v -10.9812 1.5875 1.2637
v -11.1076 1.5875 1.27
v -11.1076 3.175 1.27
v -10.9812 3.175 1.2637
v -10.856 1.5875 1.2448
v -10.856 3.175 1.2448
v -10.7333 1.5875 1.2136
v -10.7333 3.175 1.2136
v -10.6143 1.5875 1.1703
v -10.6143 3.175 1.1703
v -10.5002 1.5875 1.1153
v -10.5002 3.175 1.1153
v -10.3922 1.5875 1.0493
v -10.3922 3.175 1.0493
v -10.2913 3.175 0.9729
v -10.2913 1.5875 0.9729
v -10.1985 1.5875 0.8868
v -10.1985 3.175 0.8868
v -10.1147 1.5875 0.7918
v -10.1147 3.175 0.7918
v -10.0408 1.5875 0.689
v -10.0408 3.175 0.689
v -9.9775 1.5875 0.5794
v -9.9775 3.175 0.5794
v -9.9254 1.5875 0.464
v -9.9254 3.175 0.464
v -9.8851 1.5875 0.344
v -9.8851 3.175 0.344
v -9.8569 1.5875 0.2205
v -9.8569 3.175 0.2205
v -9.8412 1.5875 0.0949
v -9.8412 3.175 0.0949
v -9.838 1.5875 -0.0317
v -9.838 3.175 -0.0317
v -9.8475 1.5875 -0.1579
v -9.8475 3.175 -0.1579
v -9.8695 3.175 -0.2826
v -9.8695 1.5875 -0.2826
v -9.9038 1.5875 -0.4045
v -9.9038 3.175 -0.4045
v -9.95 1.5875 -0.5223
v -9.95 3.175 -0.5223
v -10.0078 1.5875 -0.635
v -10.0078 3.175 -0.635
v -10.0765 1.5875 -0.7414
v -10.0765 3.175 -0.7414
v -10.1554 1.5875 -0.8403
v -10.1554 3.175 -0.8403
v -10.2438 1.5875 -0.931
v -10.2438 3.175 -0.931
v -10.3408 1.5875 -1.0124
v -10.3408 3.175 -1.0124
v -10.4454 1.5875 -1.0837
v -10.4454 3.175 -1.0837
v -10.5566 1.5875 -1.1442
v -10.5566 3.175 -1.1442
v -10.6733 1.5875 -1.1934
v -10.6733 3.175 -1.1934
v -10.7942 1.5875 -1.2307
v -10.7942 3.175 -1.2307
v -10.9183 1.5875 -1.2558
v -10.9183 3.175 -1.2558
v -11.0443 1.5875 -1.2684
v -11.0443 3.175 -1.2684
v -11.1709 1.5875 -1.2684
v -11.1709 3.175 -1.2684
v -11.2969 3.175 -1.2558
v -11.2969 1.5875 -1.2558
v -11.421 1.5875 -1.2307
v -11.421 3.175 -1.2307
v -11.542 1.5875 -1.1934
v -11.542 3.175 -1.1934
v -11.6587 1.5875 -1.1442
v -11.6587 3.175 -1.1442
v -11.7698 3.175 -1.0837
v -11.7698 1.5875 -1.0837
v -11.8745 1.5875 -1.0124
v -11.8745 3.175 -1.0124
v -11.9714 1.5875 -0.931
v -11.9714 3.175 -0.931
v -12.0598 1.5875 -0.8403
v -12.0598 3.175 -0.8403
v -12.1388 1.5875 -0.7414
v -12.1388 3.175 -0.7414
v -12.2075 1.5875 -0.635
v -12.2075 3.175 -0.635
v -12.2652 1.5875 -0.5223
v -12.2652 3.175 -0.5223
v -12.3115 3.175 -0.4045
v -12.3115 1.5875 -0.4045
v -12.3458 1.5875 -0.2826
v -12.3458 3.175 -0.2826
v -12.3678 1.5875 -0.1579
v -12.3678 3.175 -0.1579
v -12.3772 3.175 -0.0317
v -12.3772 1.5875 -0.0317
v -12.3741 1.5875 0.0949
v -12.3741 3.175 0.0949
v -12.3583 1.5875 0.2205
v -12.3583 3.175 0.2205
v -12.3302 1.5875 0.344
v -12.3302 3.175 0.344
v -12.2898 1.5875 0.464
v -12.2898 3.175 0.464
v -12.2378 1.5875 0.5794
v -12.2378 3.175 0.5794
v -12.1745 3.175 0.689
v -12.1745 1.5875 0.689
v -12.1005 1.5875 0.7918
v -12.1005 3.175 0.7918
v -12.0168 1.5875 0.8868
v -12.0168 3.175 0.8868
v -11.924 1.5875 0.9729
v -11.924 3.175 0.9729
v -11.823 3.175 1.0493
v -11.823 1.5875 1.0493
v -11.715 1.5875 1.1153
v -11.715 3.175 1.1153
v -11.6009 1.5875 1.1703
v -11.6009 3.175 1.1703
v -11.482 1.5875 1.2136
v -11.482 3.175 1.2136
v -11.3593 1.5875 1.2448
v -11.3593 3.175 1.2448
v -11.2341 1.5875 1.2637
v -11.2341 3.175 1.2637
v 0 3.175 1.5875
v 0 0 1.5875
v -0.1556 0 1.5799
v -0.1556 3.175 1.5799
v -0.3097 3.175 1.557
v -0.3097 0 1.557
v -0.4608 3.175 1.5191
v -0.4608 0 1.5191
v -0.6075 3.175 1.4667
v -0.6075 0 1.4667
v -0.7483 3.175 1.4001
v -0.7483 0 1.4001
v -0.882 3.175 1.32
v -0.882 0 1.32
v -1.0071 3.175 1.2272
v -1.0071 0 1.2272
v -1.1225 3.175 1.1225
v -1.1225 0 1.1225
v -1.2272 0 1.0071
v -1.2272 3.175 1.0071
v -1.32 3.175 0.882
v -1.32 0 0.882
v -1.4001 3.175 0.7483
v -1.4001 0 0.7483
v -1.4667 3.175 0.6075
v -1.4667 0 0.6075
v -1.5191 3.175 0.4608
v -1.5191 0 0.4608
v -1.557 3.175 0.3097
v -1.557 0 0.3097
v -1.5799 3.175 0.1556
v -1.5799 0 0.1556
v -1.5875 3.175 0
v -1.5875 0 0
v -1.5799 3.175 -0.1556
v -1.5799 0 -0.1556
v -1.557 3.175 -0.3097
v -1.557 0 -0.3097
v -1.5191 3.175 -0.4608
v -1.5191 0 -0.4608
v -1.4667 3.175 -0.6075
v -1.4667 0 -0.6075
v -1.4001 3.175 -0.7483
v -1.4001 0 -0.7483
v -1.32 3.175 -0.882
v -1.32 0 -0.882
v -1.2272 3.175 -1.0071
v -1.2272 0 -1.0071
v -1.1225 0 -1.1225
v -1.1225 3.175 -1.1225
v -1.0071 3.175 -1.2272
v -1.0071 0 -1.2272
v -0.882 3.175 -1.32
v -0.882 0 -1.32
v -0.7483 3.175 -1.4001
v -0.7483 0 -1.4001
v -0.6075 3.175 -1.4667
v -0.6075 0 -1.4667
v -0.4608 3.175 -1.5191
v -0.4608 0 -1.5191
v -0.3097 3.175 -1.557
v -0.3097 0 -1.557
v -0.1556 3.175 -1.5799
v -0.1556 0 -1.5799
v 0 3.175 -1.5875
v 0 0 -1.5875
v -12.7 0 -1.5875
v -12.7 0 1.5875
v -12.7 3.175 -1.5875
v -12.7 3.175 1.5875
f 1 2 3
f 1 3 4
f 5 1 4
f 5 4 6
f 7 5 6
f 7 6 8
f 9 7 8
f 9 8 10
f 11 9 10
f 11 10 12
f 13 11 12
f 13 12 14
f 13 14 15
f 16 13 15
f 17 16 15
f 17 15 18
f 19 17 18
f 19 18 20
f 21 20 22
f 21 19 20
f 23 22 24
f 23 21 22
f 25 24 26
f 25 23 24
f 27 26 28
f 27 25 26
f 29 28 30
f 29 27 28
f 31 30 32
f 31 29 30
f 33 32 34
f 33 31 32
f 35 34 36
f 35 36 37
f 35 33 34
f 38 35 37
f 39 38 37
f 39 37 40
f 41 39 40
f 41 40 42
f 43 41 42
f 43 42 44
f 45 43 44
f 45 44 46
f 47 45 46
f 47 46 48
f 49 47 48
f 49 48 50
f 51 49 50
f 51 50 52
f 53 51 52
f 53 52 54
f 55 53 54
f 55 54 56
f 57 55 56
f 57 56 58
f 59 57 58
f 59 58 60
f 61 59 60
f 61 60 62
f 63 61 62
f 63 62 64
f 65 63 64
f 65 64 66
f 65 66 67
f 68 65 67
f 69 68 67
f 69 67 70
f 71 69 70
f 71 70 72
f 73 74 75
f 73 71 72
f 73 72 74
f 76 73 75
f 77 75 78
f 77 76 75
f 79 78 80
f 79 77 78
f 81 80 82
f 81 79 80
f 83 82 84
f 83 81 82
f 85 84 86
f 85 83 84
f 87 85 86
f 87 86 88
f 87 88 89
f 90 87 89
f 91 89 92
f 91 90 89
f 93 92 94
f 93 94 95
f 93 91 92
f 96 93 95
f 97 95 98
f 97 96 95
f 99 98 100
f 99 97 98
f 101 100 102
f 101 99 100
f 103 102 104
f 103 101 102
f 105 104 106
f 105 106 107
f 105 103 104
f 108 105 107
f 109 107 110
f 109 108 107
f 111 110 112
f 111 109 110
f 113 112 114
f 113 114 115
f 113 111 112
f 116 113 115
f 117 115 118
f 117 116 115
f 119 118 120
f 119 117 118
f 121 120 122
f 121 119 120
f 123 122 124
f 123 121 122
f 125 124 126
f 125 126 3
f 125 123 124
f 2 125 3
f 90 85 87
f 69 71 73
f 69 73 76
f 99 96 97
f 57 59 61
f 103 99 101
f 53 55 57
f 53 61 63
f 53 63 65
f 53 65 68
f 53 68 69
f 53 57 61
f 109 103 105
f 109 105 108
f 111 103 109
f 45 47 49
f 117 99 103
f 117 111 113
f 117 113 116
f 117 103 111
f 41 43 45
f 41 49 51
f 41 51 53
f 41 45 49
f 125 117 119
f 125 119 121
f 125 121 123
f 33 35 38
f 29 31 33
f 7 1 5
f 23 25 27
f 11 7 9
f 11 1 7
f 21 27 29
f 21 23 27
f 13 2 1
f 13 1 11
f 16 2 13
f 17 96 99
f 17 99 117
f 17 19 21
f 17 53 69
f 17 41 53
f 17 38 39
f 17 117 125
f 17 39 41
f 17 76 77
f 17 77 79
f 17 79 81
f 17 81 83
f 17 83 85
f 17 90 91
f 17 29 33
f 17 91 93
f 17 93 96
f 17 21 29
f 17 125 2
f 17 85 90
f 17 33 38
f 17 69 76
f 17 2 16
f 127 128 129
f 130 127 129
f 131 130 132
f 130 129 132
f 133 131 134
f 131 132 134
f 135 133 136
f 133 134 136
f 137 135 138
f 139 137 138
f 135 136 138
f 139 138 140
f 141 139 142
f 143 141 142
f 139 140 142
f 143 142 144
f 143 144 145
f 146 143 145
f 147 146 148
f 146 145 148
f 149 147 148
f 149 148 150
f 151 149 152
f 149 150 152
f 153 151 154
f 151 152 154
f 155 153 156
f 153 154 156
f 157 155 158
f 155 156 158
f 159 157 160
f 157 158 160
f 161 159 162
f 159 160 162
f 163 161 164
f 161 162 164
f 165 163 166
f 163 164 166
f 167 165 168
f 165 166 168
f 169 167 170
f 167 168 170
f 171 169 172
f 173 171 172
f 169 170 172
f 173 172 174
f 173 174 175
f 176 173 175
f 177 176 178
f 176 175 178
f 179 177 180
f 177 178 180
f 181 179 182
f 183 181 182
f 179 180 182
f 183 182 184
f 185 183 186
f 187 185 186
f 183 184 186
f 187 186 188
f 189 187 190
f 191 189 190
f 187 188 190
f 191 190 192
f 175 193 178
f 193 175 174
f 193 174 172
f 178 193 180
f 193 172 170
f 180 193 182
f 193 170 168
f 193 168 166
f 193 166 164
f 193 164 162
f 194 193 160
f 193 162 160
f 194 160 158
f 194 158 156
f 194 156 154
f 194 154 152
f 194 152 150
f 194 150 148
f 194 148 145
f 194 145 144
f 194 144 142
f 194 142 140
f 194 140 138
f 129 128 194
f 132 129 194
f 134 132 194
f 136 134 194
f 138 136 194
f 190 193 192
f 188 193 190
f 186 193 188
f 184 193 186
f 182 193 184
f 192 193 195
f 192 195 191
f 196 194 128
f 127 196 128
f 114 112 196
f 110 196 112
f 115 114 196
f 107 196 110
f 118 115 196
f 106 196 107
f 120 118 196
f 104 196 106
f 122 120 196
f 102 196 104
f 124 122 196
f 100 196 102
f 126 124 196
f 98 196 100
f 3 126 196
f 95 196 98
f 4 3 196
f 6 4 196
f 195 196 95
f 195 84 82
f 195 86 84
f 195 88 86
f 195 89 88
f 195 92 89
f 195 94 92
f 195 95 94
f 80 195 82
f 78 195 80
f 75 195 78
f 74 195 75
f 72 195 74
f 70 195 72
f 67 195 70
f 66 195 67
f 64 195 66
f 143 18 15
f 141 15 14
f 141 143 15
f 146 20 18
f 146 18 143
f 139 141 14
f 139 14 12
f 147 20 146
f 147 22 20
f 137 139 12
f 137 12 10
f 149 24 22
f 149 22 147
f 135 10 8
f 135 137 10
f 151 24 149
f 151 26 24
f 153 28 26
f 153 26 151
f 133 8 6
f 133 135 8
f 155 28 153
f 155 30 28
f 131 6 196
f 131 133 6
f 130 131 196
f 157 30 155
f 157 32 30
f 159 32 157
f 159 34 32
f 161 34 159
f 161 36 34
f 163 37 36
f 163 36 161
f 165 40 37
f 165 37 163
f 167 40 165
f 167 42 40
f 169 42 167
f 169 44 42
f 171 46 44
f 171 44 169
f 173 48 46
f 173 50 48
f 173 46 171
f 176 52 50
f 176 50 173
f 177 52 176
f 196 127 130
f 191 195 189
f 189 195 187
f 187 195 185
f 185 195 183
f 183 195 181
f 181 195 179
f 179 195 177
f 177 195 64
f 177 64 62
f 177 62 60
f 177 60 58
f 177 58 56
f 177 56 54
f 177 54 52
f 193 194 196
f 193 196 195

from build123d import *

# Parameters (mm, degrees)
BOSS_EXTRUDE2_DEPTH = 3.175
SKETCH1_6_W         = 3.175
SKETCH1_6_H         = 3.175
SKETCH1_6_R         = 1.27
BOSS_EXTRUDE6_DEPTH = 3.175
SKETCH1_8_R         = 1.27
BOSS_EXTRUDE7_DEPTH = 1.5875


with BuildPart() as part:
    # Sketch1 → Boss-Extrude2 (new body)
    with BuildSketch(Plane(origin=(0, 0, 0), x_dir=(1, 0, 0), z_dir=(0, 1, 0))):
        with BuildLine():
            Line((-2.749630657, 1.5875), (-9.525, 1.5875))
            Line((-9.525, 1.5875), (-9.525, -1.5875))
            Line((-9.525, -1.5875), (-2.749630657, -1.5875))
            Line((-2.749630657, -1.5875), (0, -1.5875))
            ThreePointArc((0, -1.5875), (-1.5875, 0), (0, 1.5875))
            Line((0, 1.5875), (-2.749630657, 1.5875))
        make_face()
    extrude(amount=BOSS_EXTRUDE2_DEPTH)

    # Sketch1<6> → Boss-Extrude6 (add)
    with BuildSketch(Plane(origin=(0, 0, 0), x_dir=(1, 0, 0), z_dir=(0, 1, 0))):
        with Locations((-11.1125, 0)):
            Rectangle(SKETCH1_6_W, SKETCH1_6_H)
        with Locations(Location((-11.107619253, 0, 0), (0, 0, 270))):
            Circle(SKETCH1_6_R, mode=Mode.SUBTRACT)
    extrude(amount=BOSS_EXTRUDE6_DEPTH)

    # Sketch1<8> → Boss-Extrude7 (add)
    with BuildSketch(Plane(origin=(0, 0, 0), x_dir=(1, 0, 0), z_dir=(0, 1, 0))):
        with Locations(Location((-11.107619253, 0, 0), (0, 0, 270))):
            Circle(SKETCH1_8_R)
    extrude(amount=BOSS_EXTRUDE7_DEPTH)


solid = part.part
